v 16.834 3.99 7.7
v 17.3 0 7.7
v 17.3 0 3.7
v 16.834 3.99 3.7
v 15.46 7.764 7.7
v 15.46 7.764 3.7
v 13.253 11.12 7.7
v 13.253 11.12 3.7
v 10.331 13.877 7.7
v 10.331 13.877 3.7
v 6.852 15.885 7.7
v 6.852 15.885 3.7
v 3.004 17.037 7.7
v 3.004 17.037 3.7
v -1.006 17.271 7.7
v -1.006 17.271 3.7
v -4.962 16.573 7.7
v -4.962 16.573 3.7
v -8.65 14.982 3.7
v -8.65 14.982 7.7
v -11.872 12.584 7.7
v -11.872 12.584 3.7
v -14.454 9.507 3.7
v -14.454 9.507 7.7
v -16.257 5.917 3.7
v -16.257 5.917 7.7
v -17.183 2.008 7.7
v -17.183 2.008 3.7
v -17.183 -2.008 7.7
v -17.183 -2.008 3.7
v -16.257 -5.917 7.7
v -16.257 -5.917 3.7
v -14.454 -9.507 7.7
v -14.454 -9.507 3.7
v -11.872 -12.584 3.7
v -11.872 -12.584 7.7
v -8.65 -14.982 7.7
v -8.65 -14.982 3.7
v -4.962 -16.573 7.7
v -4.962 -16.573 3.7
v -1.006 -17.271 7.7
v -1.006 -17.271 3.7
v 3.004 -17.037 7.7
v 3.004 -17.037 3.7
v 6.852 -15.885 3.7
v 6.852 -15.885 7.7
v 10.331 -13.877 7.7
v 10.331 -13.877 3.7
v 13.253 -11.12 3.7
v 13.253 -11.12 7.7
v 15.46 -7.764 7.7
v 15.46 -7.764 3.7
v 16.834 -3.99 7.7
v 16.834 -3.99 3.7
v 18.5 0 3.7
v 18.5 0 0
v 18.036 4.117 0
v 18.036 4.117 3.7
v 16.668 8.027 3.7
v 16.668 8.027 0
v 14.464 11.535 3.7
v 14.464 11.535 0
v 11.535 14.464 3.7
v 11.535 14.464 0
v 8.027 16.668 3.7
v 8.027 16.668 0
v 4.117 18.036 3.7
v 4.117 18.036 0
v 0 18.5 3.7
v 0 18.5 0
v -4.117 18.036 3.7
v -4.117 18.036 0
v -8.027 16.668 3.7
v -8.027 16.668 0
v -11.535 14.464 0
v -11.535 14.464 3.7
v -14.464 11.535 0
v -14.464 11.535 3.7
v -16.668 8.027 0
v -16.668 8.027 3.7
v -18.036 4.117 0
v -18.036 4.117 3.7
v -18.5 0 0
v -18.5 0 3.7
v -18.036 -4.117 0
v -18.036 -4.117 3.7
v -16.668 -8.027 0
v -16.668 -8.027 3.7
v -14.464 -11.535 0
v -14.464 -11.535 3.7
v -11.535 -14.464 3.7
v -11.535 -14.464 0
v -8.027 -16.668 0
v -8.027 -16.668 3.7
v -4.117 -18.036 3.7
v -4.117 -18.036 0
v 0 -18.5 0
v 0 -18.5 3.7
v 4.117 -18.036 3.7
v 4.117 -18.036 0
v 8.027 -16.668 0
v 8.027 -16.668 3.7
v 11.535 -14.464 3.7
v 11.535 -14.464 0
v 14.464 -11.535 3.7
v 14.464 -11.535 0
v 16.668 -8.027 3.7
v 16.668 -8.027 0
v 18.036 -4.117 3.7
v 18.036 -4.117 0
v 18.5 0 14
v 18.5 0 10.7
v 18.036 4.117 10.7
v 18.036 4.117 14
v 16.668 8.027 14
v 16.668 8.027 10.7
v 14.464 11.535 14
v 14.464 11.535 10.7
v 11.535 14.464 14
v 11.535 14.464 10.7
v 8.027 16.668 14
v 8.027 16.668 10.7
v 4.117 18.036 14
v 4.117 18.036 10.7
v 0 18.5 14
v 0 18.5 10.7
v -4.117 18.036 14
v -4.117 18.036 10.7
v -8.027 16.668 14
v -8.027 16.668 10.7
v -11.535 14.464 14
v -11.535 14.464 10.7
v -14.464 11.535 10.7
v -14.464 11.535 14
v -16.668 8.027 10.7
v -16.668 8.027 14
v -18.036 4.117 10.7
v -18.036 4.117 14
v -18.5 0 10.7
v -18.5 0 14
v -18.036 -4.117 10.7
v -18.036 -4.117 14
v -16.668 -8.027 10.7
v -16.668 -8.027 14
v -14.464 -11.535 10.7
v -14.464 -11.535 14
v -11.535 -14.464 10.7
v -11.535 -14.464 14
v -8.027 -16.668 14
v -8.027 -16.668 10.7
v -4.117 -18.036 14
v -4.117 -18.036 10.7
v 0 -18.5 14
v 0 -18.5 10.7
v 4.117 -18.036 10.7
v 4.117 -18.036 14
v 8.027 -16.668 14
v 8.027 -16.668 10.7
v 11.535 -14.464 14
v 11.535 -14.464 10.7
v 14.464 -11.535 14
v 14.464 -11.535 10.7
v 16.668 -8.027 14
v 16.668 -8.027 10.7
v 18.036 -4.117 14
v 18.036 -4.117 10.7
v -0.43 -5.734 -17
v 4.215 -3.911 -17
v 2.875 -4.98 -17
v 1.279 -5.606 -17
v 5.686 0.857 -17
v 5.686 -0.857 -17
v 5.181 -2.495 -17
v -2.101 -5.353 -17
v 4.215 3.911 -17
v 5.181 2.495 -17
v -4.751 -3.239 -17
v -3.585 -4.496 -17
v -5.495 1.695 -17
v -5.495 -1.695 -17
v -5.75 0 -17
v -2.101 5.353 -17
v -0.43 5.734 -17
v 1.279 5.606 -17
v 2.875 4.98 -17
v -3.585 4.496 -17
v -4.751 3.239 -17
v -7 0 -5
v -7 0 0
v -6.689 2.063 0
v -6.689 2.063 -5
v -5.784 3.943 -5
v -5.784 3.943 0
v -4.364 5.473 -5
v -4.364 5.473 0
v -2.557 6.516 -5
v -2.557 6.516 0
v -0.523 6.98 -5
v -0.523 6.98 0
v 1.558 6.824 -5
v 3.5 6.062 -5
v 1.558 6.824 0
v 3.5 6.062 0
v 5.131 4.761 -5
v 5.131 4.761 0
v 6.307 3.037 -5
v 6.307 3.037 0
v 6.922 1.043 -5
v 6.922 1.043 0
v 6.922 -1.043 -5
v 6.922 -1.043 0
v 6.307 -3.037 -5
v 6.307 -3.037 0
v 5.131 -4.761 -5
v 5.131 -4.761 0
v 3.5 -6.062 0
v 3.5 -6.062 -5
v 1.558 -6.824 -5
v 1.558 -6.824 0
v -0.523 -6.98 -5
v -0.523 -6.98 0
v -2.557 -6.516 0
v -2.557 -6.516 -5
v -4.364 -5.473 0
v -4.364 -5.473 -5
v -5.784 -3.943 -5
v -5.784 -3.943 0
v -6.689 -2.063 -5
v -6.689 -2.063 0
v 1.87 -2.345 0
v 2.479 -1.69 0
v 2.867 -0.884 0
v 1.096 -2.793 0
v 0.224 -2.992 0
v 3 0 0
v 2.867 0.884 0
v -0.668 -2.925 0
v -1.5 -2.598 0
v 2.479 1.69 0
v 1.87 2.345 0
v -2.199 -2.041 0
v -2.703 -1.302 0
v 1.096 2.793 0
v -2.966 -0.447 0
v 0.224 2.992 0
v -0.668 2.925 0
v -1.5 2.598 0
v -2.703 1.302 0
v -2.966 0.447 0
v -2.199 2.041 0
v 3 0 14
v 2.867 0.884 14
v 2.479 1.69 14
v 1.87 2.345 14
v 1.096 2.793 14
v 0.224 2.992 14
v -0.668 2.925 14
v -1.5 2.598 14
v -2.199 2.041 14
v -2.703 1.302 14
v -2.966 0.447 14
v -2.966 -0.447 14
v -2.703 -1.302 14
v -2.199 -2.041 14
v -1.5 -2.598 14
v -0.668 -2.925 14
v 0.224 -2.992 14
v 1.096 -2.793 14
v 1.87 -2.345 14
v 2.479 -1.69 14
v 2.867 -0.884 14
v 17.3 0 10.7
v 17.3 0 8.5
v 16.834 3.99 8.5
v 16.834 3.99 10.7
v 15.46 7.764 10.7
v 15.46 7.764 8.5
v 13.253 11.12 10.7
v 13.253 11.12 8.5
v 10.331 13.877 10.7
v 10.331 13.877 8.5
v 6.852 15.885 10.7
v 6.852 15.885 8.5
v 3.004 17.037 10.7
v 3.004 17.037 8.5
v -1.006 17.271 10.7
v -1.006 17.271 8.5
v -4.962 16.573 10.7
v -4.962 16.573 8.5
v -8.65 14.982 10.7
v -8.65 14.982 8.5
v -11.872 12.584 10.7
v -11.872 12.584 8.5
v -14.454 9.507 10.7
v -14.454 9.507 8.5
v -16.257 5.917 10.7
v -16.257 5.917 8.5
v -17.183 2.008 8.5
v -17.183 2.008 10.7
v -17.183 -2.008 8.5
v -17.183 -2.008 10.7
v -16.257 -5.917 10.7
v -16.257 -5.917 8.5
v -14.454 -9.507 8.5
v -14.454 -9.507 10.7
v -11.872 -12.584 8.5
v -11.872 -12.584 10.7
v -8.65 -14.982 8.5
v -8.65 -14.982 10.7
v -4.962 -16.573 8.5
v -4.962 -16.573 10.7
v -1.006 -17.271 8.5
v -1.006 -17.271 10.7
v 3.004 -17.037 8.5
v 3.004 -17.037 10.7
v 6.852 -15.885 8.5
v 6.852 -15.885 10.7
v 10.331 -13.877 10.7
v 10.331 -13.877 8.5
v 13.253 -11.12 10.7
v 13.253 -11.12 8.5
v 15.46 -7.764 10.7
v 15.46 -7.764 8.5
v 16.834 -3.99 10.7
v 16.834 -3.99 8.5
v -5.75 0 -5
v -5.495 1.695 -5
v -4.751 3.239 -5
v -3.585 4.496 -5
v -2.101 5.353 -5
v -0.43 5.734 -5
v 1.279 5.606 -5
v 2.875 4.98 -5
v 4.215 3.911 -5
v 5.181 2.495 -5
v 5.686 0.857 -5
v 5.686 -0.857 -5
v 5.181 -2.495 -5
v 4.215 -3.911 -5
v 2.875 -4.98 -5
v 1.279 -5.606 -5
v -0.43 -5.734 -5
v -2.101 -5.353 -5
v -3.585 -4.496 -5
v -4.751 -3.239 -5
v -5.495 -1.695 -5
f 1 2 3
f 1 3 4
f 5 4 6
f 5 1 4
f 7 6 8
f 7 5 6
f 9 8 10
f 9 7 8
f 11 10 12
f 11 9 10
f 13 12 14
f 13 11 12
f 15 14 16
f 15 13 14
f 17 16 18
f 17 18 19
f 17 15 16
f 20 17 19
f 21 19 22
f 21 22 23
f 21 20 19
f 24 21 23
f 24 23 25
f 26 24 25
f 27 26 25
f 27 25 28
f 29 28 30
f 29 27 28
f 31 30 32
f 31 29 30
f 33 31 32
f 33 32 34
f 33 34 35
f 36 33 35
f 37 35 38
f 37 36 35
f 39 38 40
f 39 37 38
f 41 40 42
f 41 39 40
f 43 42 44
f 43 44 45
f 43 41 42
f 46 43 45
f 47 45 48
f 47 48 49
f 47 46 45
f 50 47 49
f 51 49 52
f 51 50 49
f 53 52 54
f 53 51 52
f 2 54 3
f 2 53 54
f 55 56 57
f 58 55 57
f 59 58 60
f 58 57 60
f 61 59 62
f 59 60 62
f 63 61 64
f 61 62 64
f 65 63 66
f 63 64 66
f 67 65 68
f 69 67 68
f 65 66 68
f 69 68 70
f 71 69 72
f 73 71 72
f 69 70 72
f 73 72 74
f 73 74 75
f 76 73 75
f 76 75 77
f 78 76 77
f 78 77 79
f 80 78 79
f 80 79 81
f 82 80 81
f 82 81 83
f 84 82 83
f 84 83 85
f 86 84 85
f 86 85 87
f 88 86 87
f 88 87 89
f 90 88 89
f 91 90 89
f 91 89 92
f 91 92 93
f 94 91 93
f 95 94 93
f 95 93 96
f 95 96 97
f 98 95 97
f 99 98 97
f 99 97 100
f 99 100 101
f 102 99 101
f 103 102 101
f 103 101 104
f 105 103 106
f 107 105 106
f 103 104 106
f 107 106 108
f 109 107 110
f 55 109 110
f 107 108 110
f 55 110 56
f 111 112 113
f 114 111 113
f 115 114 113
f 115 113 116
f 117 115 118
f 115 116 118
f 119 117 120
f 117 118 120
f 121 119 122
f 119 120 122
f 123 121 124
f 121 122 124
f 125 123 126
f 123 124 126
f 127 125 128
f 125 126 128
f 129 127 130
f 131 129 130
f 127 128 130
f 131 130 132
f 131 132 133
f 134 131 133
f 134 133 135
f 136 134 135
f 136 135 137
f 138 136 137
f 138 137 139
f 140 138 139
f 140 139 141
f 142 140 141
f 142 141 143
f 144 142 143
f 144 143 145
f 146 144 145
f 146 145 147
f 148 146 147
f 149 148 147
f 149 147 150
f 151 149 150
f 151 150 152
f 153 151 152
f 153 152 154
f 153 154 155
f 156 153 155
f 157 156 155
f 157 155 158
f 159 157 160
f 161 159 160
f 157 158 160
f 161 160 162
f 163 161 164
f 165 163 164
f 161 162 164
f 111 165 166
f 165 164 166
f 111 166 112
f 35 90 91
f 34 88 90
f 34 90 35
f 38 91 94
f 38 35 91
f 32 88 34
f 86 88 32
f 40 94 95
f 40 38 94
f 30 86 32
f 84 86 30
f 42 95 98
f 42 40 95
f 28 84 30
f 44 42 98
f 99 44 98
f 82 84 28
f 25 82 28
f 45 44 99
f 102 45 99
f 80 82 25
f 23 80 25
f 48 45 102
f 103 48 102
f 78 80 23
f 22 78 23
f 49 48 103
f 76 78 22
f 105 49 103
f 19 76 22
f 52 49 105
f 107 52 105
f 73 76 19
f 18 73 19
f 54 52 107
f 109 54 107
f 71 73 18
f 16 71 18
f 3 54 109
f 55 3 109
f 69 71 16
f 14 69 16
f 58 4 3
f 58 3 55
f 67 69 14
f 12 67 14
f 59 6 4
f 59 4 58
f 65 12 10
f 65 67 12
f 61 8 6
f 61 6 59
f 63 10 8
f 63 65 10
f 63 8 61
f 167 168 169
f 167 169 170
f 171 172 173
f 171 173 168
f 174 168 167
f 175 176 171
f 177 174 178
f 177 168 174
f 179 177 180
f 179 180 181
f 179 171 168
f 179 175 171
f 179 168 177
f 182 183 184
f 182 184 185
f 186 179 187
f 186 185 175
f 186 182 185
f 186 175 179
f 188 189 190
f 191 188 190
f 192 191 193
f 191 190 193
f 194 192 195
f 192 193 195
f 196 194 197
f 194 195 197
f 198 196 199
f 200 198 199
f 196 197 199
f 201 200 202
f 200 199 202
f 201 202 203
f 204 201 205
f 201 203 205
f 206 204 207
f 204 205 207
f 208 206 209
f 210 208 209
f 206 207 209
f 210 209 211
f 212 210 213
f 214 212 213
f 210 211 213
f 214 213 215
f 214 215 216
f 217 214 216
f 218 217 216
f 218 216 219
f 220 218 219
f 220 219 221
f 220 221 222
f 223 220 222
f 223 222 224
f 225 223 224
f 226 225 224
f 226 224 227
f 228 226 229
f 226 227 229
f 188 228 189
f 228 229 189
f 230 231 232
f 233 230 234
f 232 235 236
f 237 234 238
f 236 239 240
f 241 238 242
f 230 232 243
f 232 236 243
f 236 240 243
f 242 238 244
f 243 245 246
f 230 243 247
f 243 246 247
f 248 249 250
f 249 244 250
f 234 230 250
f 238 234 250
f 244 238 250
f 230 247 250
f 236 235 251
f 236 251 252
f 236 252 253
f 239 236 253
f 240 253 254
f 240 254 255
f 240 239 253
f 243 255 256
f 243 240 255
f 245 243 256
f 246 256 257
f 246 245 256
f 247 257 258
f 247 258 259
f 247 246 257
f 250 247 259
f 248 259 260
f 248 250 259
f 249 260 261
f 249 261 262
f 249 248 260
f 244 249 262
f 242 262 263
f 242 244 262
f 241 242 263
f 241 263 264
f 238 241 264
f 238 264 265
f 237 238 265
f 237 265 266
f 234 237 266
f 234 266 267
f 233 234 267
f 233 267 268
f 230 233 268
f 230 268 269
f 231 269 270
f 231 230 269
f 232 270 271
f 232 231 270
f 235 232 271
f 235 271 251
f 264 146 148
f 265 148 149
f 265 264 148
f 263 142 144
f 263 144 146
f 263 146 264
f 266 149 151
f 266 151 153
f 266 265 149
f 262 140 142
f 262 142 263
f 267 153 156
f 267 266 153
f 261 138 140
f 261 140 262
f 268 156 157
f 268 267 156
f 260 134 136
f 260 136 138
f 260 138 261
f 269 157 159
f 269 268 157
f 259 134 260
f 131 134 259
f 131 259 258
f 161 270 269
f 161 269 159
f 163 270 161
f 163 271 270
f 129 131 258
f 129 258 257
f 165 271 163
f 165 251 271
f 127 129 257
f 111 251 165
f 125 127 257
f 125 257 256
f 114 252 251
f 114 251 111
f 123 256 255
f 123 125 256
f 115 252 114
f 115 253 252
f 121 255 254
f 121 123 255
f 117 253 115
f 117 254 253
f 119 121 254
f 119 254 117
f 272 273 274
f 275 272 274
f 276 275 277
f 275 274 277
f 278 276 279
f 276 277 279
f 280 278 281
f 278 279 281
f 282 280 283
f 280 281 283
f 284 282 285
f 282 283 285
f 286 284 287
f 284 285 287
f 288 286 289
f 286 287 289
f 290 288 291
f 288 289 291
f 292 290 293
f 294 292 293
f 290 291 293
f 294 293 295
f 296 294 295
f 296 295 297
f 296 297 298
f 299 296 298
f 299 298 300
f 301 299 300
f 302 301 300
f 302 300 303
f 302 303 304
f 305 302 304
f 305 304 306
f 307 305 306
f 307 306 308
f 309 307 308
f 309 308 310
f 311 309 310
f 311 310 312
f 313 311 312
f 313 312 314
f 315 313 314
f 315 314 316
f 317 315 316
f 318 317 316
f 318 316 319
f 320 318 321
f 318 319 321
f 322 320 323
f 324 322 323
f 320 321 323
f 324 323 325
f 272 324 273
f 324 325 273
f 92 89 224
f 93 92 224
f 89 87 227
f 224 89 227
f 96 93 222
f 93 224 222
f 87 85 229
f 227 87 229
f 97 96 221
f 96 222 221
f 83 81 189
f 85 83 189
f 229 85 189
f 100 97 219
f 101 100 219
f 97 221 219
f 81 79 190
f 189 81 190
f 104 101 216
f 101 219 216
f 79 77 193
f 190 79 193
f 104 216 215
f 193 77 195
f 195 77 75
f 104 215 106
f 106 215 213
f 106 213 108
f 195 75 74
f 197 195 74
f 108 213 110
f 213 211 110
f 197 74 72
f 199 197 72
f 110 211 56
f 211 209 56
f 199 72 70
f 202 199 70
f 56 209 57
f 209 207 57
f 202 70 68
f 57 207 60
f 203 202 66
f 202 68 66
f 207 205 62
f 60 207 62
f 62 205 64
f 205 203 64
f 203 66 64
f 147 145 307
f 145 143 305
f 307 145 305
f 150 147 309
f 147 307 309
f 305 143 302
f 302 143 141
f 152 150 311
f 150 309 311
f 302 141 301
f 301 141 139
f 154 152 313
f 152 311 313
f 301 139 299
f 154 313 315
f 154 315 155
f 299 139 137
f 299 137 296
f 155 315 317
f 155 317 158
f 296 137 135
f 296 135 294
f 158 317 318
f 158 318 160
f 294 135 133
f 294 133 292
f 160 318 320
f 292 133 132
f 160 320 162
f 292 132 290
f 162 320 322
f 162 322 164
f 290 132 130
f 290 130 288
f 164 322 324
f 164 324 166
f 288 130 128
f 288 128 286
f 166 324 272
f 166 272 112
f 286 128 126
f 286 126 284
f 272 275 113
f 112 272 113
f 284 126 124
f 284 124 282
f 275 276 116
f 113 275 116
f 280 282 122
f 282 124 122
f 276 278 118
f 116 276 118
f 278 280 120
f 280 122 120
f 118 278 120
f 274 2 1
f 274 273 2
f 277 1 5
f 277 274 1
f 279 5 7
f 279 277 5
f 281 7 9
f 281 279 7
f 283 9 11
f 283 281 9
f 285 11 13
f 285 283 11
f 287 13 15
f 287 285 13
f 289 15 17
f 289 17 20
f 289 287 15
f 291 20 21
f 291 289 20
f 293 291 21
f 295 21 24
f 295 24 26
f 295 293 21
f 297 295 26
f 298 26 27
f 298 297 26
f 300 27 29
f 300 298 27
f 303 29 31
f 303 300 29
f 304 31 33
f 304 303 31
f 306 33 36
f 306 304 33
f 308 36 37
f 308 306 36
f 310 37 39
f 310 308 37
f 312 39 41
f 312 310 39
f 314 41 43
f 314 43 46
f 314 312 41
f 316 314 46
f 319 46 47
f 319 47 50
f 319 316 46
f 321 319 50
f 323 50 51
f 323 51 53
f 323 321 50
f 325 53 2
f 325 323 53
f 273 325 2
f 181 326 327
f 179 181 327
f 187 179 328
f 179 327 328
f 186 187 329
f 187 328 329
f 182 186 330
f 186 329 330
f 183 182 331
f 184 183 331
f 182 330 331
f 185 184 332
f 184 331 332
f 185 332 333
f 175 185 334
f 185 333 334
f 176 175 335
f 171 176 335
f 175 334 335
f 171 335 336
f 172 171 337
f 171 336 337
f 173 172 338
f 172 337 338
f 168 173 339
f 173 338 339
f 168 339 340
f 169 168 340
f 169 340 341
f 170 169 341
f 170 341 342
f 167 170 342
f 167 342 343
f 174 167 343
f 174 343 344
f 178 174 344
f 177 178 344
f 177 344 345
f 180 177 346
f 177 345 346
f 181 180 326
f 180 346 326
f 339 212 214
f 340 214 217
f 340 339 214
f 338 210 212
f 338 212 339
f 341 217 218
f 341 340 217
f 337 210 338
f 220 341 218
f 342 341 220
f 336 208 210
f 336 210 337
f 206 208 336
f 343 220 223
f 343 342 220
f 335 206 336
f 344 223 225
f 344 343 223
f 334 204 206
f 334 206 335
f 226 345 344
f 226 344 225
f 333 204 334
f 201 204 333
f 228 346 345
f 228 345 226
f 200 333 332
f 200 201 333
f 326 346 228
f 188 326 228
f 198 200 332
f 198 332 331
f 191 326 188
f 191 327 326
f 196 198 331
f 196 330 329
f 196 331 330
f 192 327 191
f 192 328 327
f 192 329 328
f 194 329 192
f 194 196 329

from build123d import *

# Parameters (mm, degrees)
SKETCH_1_R          = 18.5
SKETCH_1_R_2        = 3
EXTRUDE_1_DEPTH     = 14
CUT_EXTRUDE_START   = -2.2
SKETCH_2_R          = 18.5
SKETCH_2_R_2        = 17.3
CUT_EXTRUDE_1_DEPTH = 2.2
SKETCH_2_2_R        = 18.5
SKETCH_2_2_R_2      = 17.3
CUT_EXTRUDE_2_DEPTH = 0.8
CUT_EXTRUDE_START_2 = -4
SKETCH_2_4_R        = 18.5
SKETCH_2_4_R_2      = 17.3
CUT_EXTRUDE_3_DEPTH = 4
SKETCH_2_6_R        = 18.5
SKETCH_2_6_R_2      = 17.3
CUT_EXTRUDE_5_DEPTH = 3
SKETCH_3_R          = 7
EXTRUDE_3_DEPTH     = 5
SKETCH_4_R          = 5.75
EXTRUDE_4_DEPTH     = 12


with BuildPart() as part:
    # 草图1 → 凸台-拉伸1 (new body)
    with BuildSketch(Plane.XY):
        Circle(SKETCH_1_R)
        Circle(SKETCH_1_R_2, mode=Mode.SUBTRACT)
    extrude(amount=EXTRUDE_1_DEPTH)

    # 草图2 → 切除-拉伸1 (cut)
    with BuildSketch(Plane.XY.offset(7.7).offset(CUT_EXTRUDE_START)):
        Circle(SKETCH_2_R)
        Circle(SKETCH_2_R_2, mode=Mode.SUBTRACT)
    extrude(amount=CUT_EXTRUDE_1_DEPTH, mode=Mode.SUBTRACT)

    # 草图2<2> → 切除-拉伸2 (cut)
    with BuildSketch(Plane.XY.offset(7.7)):
        Circle(SKETCH_2_2_R)
        Circle(SKETCH_2_2_R_2, mode=Mode.SUBTRACT)
    extrude(amount=CUT_EXTRUDE_2_DEPTH, mode=Mode.SUBTRACT)

    # 草图2<4> → 切除-拉伸3 (cut)
    with BuildSketch(Plane.XY.offset(7.7).offset(CUT_EXTRUDE_START_2)):
        Circle(SKETCH_2_4_R)
        Circle(SKETCH_2_4_R_2, mode=Mode.SUBTRACT)
    extrude(amount=CUT_EXTRUDE_3_DEPTH, mode=Mode.SUBTRACT)

    # 草图2<6> → 切除-拉伸5 (cut)
    with BuildSketch(Plane.XY.offset(7.7)):
        Circle(SKETCH_2_6_R)
        Circle(SKETCH_2_6_R_2, mode=Mode.SUBTRACT)
    extrude(amount=CUT_EXTRUDE_5_DEPTH, mode=Mode.SUBTRACT)

    # 草图3 → 凸台-拉伸3 (add)
    with BuildSketch(Plane(origin=(0, 0, 0), x_dir=(-1, 0, 0), z_dir=(0, 0, -1))):
        Circle(SKETCH_3_R)
    extrude(amount=EXTRUDE_3_DEPTH)

    # 草图4 → 凸台-拉伸4 (add)
    with BuildSketch(Plane(origin=(0, 0, -5), x_dir=(-1, 0, 0), z_dir=(0, 0, -1))):
        Circle(SKETCH_4_R)
    extrude(amount=EXTRUDE_4_DEPTH)


solid = part.part
